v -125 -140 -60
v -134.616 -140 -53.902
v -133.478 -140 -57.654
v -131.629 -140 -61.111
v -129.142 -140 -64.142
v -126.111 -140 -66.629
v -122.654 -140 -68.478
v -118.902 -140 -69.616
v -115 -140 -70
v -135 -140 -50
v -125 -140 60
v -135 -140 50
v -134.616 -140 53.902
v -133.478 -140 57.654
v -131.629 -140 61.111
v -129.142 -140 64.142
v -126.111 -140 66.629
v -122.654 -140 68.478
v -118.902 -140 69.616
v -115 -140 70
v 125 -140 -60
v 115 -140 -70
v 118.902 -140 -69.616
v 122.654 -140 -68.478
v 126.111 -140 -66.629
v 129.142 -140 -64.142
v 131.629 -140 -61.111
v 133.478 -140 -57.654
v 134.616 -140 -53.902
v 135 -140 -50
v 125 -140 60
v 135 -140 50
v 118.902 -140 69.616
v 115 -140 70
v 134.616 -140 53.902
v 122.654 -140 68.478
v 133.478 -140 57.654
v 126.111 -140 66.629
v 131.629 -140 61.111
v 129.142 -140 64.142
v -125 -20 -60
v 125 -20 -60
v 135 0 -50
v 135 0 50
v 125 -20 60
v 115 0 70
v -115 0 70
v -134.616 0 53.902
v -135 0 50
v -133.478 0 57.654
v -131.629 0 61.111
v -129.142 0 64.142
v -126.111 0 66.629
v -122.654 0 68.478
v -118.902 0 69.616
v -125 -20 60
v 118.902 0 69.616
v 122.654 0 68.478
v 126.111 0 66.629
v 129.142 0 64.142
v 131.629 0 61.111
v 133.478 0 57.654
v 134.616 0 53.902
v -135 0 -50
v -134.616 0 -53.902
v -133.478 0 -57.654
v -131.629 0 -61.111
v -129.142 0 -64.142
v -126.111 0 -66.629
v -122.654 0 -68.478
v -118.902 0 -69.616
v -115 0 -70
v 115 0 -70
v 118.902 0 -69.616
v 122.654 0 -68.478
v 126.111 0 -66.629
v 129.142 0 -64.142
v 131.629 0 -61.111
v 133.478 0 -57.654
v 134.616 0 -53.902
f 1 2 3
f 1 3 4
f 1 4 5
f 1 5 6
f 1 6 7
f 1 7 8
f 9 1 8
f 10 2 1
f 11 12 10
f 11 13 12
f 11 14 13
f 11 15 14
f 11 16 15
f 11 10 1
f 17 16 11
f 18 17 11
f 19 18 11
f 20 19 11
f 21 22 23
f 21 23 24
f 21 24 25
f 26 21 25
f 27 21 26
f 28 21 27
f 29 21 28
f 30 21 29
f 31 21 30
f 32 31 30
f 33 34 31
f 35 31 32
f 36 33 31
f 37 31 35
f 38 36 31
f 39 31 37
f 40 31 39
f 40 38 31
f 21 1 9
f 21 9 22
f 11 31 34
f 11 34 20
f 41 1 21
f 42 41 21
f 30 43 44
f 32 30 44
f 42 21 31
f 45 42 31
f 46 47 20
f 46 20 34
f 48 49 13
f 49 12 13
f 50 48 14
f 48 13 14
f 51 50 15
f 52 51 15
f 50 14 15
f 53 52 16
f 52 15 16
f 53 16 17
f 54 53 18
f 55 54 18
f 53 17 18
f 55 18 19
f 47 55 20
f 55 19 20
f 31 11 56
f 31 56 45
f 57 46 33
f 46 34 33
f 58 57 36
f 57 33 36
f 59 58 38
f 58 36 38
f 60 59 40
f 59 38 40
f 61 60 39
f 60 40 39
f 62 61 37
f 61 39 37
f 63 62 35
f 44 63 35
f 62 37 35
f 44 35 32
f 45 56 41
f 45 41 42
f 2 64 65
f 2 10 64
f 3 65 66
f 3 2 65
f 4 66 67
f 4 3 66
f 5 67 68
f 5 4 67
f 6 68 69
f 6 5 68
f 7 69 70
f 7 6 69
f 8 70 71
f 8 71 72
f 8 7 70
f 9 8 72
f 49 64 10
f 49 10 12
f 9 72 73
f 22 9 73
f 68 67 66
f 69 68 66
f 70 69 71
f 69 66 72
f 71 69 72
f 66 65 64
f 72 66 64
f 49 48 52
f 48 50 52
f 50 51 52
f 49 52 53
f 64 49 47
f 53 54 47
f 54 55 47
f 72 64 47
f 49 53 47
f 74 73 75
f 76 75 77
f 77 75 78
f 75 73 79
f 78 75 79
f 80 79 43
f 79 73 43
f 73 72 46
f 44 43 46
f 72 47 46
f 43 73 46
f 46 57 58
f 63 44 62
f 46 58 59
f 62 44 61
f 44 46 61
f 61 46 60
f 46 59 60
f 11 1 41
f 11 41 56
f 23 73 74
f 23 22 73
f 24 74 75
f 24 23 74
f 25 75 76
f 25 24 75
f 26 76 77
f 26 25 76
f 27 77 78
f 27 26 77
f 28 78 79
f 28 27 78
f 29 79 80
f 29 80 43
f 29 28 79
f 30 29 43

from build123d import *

# Parameters (mm, degrees)
F0_W     = 270
F0_H     = 140
F1_DEPTH = 140
F2_W     = 250
F2_H     = 120
F3_DEPTH = 120
F4_R     = 20


with BuildPart() as f1:
    # F0 (on Front) → F1 (new body)
    with BuildSketch(Plane.XZ):
        Rectangle(F0_W, F0_H)
    extrude(amount=F1_DEPTH)

    # F2 (on face) → F3 (cut)
    with BuildSketch(Plane.XZ.offset(140)):
        Rectangle(F2_W, F2_H)
    extrude(amount=-F3_DEPTH, mode=Mode.SUBTRACT)

    # F4
    f4_edges = [f1.edges().sort_by_distance(p)[0] for p in [
        (135, -70, 70),
        (-135, -70, 70),
        (135, -70, -70),
        (-135, -70, -70),
    ]]
    fillet(f4_edges, radius=F4_R)


solid = f1.part
